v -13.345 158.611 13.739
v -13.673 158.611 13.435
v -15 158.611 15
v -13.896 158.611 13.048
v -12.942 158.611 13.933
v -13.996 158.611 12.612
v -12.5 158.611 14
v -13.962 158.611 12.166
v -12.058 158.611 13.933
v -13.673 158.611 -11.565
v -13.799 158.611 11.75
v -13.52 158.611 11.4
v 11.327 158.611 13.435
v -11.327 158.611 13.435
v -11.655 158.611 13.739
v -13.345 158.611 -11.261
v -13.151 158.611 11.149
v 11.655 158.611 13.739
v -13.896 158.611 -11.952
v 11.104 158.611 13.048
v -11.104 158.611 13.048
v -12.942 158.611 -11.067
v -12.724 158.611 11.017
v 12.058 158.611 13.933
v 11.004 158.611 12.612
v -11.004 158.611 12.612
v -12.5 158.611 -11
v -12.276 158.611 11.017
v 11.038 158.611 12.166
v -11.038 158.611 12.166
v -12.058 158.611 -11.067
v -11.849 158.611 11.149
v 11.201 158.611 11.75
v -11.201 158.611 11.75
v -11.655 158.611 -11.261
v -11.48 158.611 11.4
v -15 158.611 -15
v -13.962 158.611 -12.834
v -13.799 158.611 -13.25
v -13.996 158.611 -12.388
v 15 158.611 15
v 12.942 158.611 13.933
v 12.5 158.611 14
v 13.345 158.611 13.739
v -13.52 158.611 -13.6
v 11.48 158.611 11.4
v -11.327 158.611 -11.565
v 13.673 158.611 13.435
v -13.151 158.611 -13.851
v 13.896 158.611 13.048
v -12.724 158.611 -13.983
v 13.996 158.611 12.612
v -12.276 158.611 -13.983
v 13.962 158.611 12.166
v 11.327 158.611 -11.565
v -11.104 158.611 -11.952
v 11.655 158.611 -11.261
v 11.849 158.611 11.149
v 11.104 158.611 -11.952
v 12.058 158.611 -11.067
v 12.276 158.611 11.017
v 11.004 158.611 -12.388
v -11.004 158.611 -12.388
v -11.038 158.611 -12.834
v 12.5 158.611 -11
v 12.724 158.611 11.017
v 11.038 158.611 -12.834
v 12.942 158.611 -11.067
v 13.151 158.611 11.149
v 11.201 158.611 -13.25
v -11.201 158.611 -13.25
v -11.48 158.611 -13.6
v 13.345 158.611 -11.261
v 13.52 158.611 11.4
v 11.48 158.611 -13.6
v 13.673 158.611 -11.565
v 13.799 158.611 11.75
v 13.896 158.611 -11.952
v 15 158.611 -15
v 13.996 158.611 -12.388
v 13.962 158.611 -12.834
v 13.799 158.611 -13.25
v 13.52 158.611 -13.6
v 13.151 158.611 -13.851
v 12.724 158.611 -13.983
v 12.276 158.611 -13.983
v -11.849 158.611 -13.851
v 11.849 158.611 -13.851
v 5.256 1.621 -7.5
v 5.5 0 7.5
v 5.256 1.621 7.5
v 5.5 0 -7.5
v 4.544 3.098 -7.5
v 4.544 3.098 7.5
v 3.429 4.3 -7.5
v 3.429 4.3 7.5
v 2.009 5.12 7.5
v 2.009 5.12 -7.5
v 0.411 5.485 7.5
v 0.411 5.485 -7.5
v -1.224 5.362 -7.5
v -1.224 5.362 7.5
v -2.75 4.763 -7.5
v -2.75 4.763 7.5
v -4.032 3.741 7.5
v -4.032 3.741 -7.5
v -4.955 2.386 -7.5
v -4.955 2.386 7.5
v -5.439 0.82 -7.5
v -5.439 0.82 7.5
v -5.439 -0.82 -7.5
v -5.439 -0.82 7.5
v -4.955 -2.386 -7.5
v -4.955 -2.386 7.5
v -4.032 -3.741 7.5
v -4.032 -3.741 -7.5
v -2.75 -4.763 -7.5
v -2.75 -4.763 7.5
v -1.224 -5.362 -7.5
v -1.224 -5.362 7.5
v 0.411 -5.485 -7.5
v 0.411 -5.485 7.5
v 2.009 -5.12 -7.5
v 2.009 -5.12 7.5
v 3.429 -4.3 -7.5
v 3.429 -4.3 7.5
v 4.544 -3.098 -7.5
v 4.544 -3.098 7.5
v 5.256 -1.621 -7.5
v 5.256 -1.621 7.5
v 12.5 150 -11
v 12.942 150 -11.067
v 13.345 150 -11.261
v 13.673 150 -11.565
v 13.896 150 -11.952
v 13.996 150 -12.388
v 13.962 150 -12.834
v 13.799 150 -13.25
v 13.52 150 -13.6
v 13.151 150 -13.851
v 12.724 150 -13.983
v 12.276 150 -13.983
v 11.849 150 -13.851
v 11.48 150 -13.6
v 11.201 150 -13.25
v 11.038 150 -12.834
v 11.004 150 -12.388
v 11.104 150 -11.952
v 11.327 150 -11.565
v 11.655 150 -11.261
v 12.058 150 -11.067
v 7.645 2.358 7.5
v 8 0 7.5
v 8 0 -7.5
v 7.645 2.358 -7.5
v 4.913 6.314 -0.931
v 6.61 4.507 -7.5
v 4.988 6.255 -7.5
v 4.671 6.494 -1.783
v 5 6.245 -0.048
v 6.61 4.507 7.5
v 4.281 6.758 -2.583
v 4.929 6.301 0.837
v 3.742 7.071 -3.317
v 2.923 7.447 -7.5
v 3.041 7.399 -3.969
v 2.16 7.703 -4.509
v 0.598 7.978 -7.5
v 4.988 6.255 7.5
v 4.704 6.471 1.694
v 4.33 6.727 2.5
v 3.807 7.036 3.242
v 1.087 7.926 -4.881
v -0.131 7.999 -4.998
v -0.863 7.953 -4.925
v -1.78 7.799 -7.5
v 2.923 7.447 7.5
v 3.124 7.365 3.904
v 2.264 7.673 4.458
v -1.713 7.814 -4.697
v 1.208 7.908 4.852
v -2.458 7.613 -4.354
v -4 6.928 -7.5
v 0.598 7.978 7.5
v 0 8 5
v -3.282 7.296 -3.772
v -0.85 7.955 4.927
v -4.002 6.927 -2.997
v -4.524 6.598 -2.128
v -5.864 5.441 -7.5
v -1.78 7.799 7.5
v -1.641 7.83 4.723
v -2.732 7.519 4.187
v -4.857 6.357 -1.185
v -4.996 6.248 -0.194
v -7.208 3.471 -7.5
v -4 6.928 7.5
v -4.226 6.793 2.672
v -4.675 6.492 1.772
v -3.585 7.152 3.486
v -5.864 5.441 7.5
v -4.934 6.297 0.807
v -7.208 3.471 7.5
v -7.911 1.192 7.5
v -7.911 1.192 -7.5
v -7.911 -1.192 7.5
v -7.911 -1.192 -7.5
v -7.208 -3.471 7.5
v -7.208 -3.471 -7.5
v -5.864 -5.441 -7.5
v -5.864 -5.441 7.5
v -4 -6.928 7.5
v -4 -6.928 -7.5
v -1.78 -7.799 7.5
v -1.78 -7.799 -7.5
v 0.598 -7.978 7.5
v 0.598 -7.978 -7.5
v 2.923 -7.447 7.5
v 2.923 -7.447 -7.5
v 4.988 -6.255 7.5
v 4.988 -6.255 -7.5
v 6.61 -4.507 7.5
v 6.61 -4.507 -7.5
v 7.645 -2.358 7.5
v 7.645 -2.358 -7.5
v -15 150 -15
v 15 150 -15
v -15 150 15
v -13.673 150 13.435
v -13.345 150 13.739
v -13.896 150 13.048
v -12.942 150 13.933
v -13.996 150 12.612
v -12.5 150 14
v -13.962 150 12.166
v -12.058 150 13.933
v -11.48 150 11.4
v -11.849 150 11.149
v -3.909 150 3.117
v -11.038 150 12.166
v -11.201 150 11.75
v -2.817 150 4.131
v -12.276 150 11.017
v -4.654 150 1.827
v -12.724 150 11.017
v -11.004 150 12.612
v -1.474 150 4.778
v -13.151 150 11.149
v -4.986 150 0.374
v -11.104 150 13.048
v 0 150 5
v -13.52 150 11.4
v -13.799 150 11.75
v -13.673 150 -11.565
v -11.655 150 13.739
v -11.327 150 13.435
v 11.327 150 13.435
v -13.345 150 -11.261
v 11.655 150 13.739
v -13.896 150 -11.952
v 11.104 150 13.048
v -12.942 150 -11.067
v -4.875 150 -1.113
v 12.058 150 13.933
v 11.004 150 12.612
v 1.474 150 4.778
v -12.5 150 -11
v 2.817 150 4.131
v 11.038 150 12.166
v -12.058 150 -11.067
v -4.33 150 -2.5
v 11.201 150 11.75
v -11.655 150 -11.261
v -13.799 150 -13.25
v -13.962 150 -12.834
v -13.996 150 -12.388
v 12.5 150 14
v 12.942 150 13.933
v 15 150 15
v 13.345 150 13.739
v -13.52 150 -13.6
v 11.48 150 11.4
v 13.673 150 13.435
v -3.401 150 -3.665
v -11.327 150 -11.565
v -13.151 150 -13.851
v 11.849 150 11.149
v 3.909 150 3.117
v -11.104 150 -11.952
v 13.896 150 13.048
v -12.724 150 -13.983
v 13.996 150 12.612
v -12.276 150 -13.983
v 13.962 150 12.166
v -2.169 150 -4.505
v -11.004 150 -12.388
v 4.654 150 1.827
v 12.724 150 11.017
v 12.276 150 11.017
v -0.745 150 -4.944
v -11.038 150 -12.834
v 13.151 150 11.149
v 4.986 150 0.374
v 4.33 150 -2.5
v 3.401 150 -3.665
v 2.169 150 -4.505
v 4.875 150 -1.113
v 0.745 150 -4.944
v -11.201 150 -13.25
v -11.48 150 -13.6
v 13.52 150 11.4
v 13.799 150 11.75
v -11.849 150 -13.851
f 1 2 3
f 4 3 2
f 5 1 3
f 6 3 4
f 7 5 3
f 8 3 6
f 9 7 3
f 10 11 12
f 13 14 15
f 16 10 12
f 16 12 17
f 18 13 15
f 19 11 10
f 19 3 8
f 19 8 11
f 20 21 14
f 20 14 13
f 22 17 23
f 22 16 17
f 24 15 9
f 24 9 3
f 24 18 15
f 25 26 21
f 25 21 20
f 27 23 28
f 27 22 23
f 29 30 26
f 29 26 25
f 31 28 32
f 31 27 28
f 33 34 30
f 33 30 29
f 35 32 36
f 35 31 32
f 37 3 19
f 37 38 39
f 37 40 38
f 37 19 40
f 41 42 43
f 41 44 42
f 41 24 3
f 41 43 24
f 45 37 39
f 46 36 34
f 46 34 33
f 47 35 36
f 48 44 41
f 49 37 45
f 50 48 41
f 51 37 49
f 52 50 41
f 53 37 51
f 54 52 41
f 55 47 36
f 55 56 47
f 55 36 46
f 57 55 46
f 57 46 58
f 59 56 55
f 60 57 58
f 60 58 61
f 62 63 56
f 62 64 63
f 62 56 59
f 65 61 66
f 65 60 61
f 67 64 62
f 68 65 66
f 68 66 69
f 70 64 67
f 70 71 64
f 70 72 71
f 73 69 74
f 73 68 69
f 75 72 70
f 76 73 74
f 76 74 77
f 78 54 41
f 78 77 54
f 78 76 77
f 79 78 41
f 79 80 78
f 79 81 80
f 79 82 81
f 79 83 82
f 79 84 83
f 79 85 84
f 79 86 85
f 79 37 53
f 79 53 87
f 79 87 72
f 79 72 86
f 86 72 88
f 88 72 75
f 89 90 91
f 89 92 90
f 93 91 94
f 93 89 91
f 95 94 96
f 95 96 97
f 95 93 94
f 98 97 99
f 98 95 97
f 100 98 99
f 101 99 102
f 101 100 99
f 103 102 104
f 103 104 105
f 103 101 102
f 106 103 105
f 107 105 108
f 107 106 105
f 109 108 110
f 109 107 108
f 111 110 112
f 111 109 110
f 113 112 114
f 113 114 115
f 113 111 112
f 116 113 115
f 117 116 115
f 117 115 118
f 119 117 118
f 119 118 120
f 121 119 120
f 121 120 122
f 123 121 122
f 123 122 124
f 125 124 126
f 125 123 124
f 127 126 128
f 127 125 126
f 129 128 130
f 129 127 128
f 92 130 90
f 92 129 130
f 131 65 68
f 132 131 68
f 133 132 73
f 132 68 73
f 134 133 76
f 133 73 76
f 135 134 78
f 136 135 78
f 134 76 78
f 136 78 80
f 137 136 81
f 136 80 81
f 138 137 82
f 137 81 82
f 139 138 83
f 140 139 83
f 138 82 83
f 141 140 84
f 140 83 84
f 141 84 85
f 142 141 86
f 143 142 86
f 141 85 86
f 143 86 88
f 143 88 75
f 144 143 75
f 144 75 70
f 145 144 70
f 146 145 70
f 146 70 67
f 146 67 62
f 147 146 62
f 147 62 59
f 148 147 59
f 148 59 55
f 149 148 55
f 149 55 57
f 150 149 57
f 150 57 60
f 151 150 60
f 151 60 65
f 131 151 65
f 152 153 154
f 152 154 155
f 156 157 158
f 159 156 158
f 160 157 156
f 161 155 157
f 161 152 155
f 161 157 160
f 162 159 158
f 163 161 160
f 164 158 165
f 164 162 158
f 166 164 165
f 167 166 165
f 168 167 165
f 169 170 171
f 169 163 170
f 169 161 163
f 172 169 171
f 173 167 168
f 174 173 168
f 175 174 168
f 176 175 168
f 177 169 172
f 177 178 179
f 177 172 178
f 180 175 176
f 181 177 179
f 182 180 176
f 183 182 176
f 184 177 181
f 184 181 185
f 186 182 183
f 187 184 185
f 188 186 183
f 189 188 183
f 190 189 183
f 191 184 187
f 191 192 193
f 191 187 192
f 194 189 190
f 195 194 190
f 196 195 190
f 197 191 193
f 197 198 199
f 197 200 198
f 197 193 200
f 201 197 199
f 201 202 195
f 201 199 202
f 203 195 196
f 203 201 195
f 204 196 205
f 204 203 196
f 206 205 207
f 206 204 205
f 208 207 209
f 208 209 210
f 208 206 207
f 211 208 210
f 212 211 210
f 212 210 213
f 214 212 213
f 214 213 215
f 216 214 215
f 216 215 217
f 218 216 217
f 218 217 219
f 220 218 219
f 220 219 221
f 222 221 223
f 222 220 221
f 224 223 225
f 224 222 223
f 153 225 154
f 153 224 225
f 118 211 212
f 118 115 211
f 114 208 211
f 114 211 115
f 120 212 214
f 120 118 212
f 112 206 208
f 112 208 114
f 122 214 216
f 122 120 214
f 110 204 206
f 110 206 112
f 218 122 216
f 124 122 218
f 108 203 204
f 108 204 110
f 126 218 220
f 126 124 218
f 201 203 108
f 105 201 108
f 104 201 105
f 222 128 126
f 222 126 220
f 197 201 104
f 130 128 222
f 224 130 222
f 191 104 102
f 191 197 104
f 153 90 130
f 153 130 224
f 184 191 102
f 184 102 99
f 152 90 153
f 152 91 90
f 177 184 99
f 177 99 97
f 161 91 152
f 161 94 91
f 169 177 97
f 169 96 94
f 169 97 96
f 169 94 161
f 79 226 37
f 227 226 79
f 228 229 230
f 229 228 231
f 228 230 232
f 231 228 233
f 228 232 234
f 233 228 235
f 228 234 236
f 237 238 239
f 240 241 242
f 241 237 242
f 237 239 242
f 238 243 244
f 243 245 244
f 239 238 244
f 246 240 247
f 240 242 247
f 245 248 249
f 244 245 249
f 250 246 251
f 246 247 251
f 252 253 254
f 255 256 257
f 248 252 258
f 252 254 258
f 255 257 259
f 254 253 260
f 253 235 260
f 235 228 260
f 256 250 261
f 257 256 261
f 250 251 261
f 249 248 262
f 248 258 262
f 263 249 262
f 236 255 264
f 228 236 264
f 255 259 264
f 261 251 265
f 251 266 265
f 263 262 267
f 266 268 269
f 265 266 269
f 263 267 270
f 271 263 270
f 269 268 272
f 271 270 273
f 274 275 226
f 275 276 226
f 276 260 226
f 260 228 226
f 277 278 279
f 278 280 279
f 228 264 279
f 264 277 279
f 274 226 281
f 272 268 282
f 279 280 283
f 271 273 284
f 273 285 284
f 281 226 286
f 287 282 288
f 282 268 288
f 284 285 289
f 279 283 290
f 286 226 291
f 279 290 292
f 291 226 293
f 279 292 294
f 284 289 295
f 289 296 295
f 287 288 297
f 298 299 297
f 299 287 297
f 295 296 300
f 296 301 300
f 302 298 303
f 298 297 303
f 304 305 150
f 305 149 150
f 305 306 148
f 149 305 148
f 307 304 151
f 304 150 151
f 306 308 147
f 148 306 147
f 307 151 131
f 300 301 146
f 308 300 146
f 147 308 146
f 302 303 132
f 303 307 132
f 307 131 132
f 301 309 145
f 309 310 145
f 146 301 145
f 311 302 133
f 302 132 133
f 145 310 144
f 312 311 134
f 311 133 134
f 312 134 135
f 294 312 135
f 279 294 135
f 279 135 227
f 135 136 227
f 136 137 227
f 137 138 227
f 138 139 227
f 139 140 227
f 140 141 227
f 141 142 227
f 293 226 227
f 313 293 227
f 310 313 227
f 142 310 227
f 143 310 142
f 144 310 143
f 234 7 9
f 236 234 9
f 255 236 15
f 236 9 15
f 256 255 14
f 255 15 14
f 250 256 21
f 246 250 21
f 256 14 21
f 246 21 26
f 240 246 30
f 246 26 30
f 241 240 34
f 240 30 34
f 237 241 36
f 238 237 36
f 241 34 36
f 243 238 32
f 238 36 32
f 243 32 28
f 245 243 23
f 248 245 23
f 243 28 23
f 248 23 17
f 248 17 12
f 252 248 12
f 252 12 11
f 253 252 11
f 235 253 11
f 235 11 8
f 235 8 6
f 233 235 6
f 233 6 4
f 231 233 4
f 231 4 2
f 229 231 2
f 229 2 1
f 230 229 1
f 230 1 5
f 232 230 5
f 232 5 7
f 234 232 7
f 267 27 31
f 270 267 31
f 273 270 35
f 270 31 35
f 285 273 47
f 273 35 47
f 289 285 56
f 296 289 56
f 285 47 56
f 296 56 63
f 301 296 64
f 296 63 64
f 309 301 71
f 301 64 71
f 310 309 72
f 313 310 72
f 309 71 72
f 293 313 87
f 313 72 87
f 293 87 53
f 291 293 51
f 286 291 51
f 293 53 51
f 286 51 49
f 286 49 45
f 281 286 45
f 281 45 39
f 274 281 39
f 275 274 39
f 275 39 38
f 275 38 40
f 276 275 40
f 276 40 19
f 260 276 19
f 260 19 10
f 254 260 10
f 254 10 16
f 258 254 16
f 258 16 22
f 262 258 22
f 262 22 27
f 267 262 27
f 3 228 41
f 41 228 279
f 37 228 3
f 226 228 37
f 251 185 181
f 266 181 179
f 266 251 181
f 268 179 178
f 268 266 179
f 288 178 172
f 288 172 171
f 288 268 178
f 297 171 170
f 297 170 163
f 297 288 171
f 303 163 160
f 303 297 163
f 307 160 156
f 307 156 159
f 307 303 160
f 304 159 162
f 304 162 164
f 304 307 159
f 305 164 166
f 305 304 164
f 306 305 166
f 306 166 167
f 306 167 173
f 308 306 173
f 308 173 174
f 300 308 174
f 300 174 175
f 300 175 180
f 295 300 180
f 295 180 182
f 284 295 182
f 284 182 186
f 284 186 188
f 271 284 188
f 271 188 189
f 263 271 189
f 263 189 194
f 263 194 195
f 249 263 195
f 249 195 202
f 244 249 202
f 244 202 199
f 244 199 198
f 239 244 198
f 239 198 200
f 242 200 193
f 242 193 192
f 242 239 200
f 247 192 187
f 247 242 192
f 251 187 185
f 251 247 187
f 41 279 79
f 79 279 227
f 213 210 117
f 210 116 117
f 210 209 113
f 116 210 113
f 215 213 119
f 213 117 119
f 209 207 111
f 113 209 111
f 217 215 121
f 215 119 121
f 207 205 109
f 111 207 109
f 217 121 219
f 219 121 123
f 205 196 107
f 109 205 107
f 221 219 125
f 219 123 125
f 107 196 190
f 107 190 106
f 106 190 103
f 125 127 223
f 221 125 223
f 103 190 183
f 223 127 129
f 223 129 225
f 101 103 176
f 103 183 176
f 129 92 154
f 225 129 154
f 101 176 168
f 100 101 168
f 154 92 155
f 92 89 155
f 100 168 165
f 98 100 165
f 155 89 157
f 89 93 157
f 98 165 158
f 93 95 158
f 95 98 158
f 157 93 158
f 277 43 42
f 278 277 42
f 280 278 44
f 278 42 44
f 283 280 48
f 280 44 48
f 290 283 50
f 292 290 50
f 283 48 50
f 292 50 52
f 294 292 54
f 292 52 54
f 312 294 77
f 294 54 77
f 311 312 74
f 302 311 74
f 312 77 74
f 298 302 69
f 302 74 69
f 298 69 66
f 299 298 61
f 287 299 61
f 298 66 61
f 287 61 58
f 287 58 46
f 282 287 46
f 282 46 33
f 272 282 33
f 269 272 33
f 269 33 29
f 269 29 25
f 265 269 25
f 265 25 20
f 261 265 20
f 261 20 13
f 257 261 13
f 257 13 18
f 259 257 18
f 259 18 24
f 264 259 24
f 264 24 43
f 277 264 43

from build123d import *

# Parameters (mm, degrees)
SKETCH_1_R           = 8
SKETCH_1_R_2         = 5.5
EXTRUDE_1_DEPTH      = 7.5
EXTRUDE_2_REACH      = 160.38
EXTRUDE_2_END_RADIUS = 8
SKETCH_2_R           = 5
SKETCH_3_W           = 30
SKETCH_3_H           = 30
EXTRUDE_3_DEPTH      = 8.61101214
SKETCH_4_R           = 1.5
CUT_EXTRUDE_1_DEPTH  = 10


with BuildPart() as part:
    # 草图1 → 凸台-拉伸1 (new, symmetric)
    with BuildSketch(Plane.XY):
        Circle(SKETCH_1_R)
        Circle(SKETCH_1_R_2, mode=Mode.SUBTRACT)
    extrude(amount=EXTRUDE_1_DEPTH, both=True)

    # 凸台-拉伸2: up to this cylinder (the profile starts outside it)
    extrude_2_end = Plane(origin=(0, 0, 0), z_dir=(0, 0, -1)) * Cylinder(EXTRUDE_2_END_RADIUS, 337.76, mode=Mode.PRIVATE)
    # 草图2 → 凸台-拉伸2 (add, up to the surface)
    with BuildSketch(Plane(origin=(0, 150, 0), x_dir=(1, 0, 0), z_dir=(0, 1, 0)), mode=Mode.PRIVATE) as extrude_2_sk1:
        with Locations(Location((0, 0, 0), (0, 0, 270))):
            Circle(SKETCH_2_R)
    extrude_2_tool1 = extrude(extrude_2_sk1.sketch, amount=-EXTRUDE_2_REACH, mode=Mode.PRIVATE) - extrude_2_end
    add(extrude_2_tool1.solids().sort_by_distance((0, 150, 0))[0])

    # 草图3 → 凸台-拉伸3 (add)
    with BuildSketch(Plane(origin=(0, 150, 0), x_dir=(1, 0, 0), z_dir=(0, 1, 0))):
        Rectangle(SKETCH_3_W, SKETCH_3_H)
    extrude(amount=EXTRUDE_3_DEPTH)

    # 草图4 → 切除-拉伸1 (cut)
    with BuildSketch(Plane(origin=(0, 158.61101214, 0), x_dir=(1, 0, 0), z_dir=(0, 1, 0))):
        with Locations(Location((12.5, -12.5, 0), (0, 0, 270))):
            Circle(SKETCH_4_R)
        with Locations(Location((12.5, 12.5, 0), (0, 0, 270))):
            Circle(SKETCH_4_R)
        with Locations(Location((-12.5, -12.5, 0), (0, 0, 270))):
            Circle(SKETCH_4_R)
        with Locations(Location((-12.5, 12.5, 0), (0, 0, 270))):
            Circle(SKETCH_4_R)
    extrude(amount=-CUT_EXTRUDE_1_DEPTH, mode=Mode.SUBTRACT)


solid = part.part
